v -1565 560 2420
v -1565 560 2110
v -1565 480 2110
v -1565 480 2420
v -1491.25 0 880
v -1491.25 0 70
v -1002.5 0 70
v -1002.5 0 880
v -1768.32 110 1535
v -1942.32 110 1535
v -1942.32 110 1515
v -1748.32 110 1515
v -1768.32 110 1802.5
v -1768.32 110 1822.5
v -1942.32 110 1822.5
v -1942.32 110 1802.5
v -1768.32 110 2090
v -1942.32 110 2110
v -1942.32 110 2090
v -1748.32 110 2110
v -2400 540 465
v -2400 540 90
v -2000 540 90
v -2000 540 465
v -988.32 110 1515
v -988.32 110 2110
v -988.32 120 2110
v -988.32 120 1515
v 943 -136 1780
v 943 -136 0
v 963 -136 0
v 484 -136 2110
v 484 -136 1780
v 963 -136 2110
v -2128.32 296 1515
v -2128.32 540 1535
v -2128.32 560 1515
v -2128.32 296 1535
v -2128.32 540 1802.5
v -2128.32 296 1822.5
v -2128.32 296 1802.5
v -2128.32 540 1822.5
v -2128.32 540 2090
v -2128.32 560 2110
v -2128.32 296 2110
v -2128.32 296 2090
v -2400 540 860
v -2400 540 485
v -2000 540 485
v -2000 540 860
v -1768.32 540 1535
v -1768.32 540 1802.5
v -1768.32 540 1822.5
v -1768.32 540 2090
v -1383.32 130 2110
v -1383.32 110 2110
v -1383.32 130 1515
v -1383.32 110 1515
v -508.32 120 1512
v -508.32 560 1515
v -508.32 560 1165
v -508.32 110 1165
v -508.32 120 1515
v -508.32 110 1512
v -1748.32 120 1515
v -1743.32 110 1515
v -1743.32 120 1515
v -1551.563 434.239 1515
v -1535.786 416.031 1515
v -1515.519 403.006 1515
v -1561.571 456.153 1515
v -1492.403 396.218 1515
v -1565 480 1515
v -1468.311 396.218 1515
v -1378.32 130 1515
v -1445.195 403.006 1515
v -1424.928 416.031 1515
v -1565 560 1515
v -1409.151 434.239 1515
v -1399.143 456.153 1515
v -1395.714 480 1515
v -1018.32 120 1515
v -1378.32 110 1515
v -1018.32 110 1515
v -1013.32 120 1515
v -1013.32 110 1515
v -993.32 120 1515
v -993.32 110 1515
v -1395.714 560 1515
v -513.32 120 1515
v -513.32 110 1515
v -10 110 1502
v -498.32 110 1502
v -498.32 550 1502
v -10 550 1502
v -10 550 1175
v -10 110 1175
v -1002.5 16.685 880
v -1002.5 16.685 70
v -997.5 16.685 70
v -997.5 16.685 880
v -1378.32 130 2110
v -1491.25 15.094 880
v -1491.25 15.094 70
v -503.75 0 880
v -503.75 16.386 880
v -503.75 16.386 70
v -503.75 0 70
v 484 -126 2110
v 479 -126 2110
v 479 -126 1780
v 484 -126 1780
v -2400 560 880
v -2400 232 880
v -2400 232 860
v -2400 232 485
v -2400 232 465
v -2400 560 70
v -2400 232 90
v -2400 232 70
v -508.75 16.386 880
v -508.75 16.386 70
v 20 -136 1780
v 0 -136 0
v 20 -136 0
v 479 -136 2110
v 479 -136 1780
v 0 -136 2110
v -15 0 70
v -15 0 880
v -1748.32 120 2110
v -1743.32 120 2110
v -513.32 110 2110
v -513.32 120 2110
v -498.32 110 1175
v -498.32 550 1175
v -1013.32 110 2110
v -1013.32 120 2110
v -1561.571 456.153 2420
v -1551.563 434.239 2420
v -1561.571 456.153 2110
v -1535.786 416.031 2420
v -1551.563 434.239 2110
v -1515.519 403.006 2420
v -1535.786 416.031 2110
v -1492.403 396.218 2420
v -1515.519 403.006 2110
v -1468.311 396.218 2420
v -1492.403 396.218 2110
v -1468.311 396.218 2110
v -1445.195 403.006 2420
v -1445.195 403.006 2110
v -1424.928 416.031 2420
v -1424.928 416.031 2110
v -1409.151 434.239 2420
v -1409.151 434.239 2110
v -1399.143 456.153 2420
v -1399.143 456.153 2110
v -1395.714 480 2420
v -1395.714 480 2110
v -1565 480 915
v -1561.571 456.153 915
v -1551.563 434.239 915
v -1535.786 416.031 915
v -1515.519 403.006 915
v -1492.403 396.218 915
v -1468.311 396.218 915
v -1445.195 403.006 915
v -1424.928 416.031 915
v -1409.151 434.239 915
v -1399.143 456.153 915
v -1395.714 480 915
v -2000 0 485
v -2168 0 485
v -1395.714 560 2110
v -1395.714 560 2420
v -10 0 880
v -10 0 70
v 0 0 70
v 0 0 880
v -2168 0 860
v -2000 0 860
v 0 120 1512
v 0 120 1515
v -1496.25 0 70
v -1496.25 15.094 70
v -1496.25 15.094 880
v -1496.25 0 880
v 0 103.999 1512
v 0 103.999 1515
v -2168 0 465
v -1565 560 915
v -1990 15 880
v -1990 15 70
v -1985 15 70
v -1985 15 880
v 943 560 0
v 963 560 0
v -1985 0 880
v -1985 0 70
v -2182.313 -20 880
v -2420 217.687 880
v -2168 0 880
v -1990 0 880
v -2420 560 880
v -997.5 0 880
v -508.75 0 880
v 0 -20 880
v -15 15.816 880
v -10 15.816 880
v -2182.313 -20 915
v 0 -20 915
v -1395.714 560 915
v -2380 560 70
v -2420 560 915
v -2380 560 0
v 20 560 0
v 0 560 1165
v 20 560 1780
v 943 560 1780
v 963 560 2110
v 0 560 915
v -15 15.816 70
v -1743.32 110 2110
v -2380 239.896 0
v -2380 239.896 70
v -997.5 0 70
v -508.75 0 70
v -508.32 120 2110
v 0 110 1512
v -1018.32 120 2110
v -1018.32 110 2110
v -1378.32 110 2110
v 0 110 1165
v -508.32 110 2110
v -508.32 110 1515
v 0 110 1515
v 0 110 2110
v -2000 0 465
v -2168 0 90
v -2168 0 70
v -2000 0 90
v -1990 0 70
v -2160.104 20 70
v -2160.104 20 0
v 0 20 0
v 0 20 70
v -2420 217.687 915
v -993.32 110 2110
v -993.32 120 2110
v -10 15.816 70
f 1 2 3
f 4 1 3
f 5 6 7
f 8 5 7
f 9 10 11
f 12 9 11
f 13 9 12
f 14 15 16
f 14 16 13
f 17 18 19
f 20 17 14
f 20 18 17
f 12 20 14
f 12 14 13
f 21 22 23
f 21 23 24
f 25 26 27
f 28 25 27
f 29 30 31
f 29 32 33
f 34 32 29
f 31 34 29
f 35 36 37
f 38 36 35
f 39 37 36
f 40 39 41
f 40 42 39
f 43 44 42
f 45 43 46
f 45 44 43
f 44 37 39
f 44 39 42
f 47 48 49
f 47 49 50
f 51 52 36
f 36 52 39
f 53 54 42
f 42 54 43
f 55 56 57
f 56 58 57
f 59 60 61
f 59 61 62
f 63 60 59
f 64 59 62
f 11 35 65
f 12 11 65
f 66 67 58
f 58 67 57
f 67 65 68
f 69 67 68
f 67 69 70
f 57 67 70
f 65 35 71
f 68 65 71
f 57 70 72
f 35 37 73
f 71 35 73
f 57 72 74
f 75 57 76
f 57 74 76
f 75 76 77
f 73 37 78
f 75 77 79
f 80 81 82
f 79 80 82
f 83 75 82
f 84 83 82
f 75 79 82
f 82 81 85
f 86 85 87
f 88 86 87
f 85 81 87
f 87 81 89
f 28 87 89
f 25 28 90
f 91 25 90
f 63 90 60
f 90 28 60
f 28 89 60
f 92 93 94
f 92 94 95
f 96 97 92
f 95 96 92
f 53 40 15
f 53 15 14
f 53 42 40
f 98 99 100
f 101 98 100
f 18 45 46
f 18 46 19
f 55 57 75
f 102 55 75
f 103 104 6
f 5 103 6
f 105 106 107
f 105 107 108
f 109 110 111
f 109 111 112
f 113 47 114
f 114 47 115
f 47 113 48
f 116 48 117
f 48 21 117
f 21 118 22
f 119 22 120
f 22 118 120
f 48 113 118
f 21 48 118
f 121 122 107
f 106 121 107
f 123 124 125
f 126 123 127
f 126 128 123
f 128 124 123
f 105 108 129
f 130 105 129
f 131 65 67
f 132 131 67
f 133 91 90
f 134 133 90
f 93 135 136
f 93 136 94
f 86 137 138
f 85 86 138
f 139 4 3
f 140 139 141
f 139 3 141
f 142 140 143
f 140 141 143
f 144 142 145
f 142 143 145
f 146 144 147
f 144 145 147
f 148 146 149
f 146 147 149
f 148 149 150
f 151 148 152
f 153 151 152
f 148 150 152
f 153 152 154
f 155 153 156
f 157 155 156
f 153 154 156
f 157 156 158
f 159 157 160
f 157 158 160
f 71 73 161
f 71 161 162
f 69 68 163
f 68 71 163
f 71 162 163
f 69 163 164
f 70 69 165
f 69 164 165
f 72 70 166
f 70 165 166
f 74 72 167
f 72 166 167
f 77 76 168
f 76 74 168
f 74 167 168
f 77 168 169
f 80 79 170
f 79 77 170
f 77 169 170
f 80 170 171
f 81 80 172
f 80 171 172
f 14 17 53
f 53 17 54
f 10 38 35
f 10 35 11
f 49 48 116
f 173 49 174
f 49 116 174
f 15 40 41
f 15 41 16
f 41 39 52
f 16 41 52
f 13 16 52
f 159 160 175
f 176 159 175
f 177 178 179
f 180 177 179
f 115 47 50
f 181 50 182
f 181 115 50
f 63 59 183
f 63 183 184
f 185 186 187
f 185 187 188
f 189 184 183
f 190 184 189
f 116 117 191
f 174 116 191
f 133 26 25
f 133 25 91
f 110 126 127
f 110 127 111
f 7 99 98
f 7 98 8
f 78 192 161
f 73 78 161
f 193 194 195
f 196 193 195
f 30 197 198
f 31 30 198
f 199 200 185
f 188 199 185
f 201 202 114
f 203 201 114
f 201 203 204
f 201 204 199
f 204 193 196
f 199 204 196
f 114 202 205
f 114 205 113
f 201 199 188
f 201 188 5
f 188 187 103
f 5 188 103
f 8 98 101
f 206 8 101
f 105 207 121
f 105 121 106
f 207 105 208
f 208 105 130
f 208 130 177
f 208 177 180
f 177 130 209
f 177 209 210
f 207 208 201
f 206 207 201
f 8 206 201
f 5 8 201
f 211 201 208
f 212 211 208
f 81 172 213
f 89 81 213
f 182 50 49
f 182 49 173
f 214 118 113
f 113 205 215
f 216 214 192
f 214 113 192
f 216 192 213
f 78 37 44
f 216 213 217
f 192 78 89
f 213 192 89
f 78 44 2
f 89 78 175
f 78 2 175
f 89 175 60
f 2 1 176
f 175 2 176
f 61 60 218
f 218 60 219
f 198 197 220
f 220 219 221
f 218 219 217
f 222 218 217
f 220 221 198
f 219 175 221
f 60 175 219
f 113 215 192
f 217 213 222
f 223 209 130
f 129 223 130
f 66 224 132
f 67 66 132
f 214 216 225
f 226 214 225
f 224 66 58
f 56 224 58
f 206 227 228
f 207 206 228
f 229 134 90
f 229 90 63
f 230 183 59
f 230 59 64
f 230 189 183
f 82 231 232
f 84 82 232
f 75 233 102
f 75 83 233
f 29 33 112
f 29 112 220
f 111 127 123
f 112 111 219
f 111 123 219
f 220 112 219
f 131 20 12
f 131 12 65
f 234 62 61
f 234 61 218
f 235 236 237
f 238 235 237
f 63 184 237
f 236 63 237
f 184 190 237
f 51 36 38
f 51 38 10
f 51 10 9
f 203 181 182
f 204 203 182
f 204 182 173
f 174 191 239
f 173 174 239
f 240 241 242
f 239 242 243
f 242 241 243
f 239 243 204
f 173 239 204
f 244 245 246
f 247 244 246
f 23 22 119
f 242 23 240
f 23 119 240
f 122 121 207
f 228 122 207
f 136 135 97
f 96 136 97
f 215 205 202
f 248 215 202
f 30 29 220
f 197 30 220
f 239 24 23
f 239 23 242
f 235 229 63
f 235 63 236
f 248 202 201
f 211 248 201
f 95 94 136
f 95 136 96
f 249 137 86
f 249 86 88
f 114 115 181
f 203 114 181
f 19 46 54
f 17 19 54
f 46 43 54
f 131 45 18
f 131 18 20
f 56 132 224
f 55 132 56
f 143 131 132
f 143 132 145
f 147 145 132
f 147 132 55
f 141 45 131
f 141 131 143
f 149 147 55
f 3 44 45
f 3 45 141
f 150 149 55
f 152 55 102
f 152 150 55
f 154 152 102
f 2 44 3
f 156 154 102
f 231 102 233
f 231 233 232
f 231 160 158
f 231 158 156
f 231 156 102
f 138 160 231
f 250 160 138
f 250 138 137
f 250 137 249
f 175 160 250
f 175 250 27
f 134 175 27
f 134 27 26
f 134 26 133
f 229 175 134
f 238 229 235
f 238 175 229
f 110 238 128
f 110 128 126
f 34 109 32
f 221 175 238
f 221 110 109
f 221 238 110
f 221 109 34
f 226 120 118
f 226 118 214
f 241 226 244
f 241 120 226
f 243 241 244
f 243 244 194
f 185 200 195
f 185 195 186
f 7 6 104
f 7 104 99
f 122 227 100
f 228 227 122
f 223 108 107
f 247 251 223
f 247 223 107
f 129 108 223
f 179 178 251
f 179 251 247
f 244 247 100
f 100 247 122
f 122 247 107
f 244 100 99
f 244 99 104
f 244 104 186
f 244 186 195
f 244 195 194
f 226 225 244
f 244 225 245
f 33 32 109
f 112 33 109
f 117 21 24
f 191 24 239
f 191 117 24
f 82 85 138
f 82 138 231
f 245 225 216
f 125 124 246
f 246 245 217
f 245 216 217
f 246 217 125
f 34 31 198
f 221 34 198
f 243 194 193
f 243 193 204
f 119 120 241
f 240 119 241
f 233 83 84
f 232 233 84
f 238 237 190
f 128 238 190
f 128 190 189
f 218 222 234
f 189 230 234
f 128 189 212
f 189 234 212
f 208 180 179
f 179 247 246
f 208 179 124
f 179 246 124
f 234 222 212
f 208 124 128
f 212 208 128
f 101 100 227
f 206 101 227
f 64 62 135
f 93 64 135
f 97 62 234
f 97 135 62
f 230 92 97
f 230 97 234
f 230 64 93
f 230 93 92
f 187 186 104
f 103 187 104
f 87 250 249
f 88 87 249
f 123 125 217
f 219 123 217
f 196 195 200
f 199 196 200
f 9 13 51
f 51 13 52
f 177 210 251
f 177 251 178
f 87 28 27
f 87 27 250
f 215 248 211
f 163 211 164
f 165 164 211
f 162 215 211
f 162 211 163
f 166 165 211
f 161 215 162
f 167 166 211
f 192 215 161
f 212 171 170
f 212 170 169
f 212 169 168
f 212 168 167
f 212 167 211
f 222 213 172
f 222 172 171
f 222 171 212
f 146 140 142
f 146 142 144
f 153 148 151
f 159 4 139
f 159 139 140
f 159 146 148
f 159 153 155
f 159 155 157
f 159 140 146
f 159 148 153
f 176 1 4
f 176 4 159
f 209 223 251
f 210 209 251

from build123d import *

# Parameters (mm, degrees)
F1_DEPTH  = 880
F3_DEPTH  = 35
F5_DEPTH  = 70
F8_DEPTH  = 2110
F9_W      = 696
F9_H      = 330
F10_DEPTH = 923
F11_W     = 20
F11_H     = 696
F12_DEPTH = 2110
F13_W     = 5
F13_H     = 149.3338942528
F14_DEPTH = 2110.001
F17_DEPTH = 595
F21_DEPTH = 267.5
F24_DEPTH = 267.5
F25_W     = 5
F25_H     = 26.3705801964
F25_H_2   = 30.4196077585
F25_H_3   = 29.1783836484
F26_DEPTH = 600
F27_W     = 508.3196067382
F27_H     = 450
F28_DEPTH = 350
F29_W     = 16.0011241957
F29_H     = 3
F30_DEPTH = 508.31961
F31_W     = 488.3196067382
F31_H     = 327
F32_DEPTH = 440
F33_W     = 560
F33_H     = 375
F34_DEPTH = 400
F35_W     = 5
F35_H     = 19.7571682371
F35_H_2   = 24.0503801033
F35_H_3   = 23.9126509987
F35_H_4   = 22.7143368684
F35_H_5   = 21.7149001546
F36_DEPTH = 880
F38_DEPTH = 2420


with BuildPart() as f1:
    # F0 (on Top) → F1 (new body)
    with BuildSketch(Plane.XY):
        Polygon((-2168, 0), (0, 0), (0, 560), (-1800, 560), (-2400, 560), (-2400, 232), align=None)
    extrude(amount=F1_DEPTH)

    # F4 (on face) → F5 (cut)
    with BuildSketch(Plane(origin=(0, 0, 0), x_dir=(1, 0, 0), z_dir=(0, 0, -1))):
        Polygon((-2400, -560), (-2380, -560), (-2380, -239.8957603676), (-2160.1042396324, -20), (0, -20), (0, 0), (-2168, 0), (-2400, -232), align=None)
    extrude(amount=-F5_DEPTH, mode=Mode.SUBTRACT)


with BuildPart() as f3:
    # F2 (on face) → F3 (new body)
    with BuildSketch(Plane.XY.offset(880)):
        Polygon((0, -20), (0, 560), (-2420, 560), (-2420, 217.6867183745), (-2182.3132816255, -20), align=None)
    extrude(amount=F3_DEPTH)


with BuildPart() as f1_1:
    add(f1.part)

    # F6: union F3
    add(f3.part)

    # F7 (on Top) → F8 (join)
    with BuildSketch(Plane.XY):
        Polygon((0, 560), (0, 20), (0, 0), (0, -20), (0, -136), (20, -136), (20, 560), align=None)
    extrude(amount=F8_DEPTH)

    # F9 (on face) → F10 (join)
    with BuildSketch(Plane.YZ.offset(20)):
        with Locations((212, 1945)):
            Rectangle(F9_W, F9_H)
    extrude(amount=F10_DEPTH)

    # F11 (on face) → F12 (join)
    with BuildSketch(Plane.XY.offset(2110)):
        with Locations((953, 212)):
            Rectangle(F11_W, F11_H)
    extrude(amount=-F12_DEPTH)

    # F13 (on face) → F14 (cut, through all)
    with BuildSketch(Plane.XY.offset(2110)):
        with Locations((481.5, -200.6669471264)):
            Rectangle(F13_W, F13_H)
    extrude(amount=-F14_DEPTH, mode=Mode.SUBTRACT)


with BuildPart() as f17:
    # F16 (on offset) → F17 (new body)
    with BuildSketch(Plane.XY.offset(2110)):
        Polygon((0, 110), (0, 560), (-2128.3196067382, 560), (-2128.3196067382, 296), (-1942.3196067382, 110), align=None)
    extrude(amount=-F17_DEPTH)


with BuildPart() as f1_2:
    add(f1_1.part)

    # F18: union F17
    add(f17.part)

    # F20 (on offset) → F21 (cut)
    with BuildSketch(Plane.XY.offset(2090)):
        Polygon((-2128.3196067382, 296), (-1942.3196067382, 110), (-1768.3196067382, 110), (-1768.3196067382, 540), (-2128.3196067382, 540), align=None)
    extrude(amount=-F21_DEPTH, mode=Mode.SUBTRACT)

    # F23 (on offset) → F24 (cut)
    with BuildSketch(Plane.XY.offset(1802.5)):
        Polygon((-1768.3196067382, 540), (-2128.3196067382, 540), (-2128.3196067382, 296), (-1942.3196067382, 110), (-1768.3196067382, 110), align=None)
    extrude(amount=-F24_DEPTH, mode=Mode.SUBTRACT)

    # F25 (on offset) → F26 (cut, symmetric)
    with BuildSketch(Plane.XY.offset(2090)):
        with Locations((-1745.8196067382, 106.8147099018)):
            Rectangle(F25_W, F25_H)
        with Locations((-1380.8196067382, 114.7901961207)):
            Rectangle(F25_W, F25_H_2)
        Polygon((-993.3196067382, 120), (-993.3196067382, 110), (-993.3196067382, 91.5266275406), (-988.3196067382, 91.5266275406), (-988.3196067382, 120), align=None)
        Polygon((-1013.3196067382, 120), (-1018.3196067382, 120), (-1018.3196067382, 93.692086637), (-1013.3196067382, 93.692086637), (-1013.3196067382, 110), align=None)
        with Locations((-510.8196067382, 105.4108081758)):
            Rectangle(F25_W, F25_H_3)
    extrude(amount=F26_DEPTH, both=True, mode=Mode.SUBTRACT)

    # F27 (on face) → F28 (join)
    with BuildSketch(Plane(origin=(0, 0, 1515), x_dir=(1, 0, 0), z_dir=(0, 0, -1))):
        with Locations((-254.1598033691, -335)):
            Rectangle(F27_W, F27_H)
    extrude(amount=F28_DEPTH)

    # F29 (on face) → F30 (cut)
    with BuildSketch(Plane(origin=(-508.3196067382, 0, 0), x_dir=(0, -1, 0), z_dir=(-1, 0, 0))):
        with Locations((-111.9994379021, 1513.5)):
            Rectangle(F29_W, F29_H)
    extrude(amount=-F30_DEPTH, mode=Mode.SUBTRACT)

    # F31 (on face) → F32 (cut)
    with BuildSketch(Plane.XZ.offset(-110)):
        with Locations((-254.1598033691, 1338.5)):
            Rectangle(F31_W, F31_H)
    extrude(amount=-F32_DEPTH, mode=Mode.SUBTRACT)

    # F33 (on face) → F34 (cut)
    with BuildSketch(Plane(origin=(-2400, 0, 0), x_dir=(0, -1, 0), z_dir=(-1, 0, 0))):
        with Locations((-260, 672.5)):
            Rectangle(F33_W, F33_H)
        with Locations((-260, 277.5)):
            Rectangle(F33_W, F33_H)
    extrude(amount=-F34_DEPTH, mode=Mode.SUBTRACT)

    # F35 (on face) → F36 (cut)
    with BuildSketch(Plane(origin=(0, 0, 0), x_dir=(1, 0, 0), z_dir=(0, 0, -1))):
        with Locations((-1987.5, -5.1214158814)):
            Rectangle(F35_W, F35_H)
        with Locations((-1493.75, -3.069028724)):
            Rectangle(F35_W, F35_H_2)
        with Locations((-1000, -4.7291063238)):
            Rectangle(F35_W, F35_H_3)
        with Locations((-12.5, -4.4589054305)):
            Rectangle(F35_W, F35_H_4)
        with Locations((-506.25, -5.5286136921)):
            Rectangle(F35_W, F35_H_5)
    extrude(amount=-F36_DEPTH, mode=Mode.SUBTRACT)

    # F37 (on Top) → F38 (join)
    with BuildSketch(Plane.XY):
        with BuildLine():
            Line((-1395.7138633728, 560), (-1565, 560))
            Line((-1565, 560), (-1565, 480))
            ThreePointArc((-1565, 480), (-1480.3569316864, 395.3569316864), (-1395.7138633728, 480))
            Line((-1395.7138633728, 480), (-1395.7138633728, 560))
        make_face()
    extrude(amount=F38_DEPTH)


solid = f1_2.part
